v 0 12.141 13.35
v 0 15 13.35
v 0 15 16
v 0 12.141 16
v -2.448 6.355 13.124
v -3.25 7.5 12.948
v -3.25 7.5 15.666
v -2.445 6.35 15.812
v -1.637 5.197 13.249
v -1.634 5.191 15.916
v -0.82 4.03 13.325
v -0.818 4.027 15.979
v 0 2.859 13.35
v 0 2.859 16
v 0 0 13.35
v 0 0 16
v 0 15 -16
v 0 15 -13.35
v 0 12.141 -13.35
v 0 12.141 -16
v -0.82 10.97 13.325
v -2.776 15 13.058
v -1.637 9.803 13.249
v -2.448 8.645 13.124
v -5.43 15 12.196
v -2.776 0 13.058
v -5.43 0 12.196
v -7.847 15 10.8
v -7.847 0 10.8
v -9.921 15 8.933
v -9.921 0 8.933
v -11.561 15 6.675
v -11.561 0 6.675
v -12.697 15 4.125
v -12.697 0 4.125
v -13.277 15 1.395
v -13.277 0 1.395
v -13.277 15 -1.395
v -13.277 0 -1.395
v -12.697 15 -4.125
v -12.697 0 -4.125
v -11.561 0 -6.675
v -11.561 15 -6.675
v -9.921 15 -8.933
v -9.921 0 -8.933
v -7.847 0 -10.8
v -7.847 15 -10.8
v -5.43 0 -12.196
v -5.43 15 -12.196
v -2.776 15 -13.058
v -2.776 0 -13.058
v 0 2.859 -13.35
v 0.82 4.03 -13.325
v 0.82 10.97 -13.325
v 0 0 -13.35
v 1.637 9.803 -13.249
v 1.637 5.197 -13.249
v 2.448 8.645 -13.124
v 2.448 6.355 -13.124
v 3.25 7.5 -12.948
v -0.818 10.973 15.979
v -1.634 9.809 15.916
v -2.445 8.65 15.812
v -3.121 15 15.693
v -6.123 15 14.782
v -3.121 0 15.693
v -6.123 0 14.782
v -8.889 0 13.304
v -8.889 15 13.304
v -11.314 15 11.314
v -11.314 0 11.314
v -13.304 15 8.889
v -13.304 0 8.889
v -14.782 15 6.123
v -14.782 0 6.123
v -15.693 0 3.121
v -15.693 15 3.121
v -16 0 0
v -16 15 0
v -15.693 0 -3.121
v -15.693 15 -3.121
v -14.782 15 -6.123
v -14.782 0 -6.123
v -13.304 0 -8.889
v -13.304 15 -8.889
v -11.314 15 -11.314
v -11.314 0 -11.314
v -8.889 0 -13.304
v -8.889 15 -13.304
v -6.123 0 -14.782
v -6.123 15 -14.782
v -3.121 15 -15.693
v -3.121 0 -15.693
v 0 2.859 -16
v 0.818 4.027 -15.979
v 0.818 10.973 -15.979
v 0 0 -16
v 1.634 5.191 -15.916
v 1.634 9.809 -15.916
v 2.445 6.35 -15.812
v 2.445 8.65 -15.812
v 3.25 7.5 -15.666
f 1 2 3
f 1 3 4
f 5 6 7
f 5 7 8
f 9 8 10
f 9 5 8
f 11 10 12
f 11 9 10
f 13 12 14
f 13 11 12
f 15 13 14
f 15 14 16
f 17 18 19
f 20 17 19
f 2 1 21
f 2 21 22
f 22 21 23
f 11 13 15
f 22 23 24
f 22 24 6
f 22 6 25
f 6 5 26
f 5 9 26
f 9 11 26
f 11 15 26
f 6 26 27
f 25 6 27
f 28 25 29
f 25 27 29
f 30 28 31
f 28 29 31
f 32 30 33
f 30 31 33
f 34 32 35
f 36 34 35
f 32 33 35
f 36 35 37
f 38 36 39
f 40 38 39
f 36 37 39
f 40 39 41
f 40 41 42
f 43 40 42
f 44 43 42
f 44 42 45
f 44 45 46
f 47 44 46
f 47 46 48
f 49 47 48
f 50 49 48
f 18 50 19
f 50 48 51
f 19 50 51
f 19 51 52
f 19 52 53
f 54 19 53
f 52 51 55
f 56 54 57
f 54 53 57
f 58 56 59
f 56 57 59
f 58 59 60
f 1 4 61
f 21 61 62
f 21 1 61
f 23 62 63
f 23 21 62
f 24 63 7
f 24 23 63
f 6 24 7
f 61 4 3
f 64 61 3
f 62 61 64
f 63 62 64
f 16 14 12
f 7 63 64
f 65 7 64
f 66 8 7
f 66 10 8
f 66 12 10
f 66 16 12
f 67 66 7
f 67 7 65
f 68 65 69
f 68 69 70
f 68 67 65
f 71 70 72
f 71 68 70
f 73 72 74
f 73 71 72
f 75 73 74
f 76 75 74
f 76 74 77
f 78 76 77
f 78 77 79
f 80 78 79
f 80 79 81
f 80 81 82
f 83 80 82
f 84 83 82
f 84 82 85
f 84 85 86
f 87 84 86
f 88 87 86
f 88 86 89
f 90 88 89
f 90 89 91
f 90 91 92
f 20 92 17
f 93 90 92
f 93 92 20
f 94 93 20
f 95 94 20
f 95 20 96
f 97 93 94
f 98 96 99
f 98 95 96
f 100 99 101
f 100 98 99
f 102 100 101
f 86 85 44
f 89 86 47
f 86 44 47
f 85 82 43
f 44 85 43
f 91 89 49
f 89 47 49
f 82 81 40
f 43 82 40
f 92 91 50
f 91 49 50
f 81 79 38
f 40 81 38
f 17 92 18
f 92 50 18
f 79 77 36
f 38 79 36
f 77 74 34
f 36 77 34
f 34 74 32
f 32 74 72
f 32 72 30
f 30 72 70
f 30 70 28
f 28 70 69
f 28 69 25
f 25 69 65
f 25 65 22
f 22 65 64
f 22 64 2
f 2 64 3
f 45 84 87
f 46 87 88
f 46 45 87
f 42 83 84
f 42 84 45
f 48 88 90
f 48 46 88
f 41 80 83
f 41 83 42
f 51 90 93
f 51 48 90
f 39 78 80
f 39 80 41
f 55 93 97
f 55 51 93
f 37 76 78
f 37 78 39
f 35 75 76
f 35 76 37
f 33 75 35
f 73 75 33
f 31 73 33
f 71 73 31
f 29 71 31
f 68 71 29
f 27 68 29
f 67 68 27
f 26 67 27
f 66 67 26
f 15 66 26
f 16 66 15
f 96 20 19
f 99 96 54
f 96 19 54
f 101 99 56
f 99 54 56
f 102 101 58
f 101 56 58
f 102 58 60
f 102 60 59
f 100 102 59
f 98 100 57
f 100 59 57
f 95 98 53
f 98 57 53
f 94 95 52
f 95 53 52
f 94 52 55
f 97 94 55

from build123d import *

# Parameters (mm, degrees)
F0_R     = 16
F0_R_2   = 13.35
F1_DEPTH = 15
F3_DEPTH = 25
F5_DEPTH = 25


with BuildPart() as f1:
    # F0 (on Front) → F1 (new body)
    with BuildSketch(Plane.XZ):
        Circle(F0_R)
        Circle(F0_R_2, mode=Mode.SUBTRACT)
    extrude(amount=-F1_DEPTH)

    # F2 (on Top) → F3 (cut)
    with BuildSketch(Plane.XY):
        Polygon((16, 0), (16, 15), (0, 15), (0, 12.141481), (3.25, 7.5), (0, 2.858519), (0, 0), align=None)
    extrude(amount=-F3_DEPTH, mode=Mode.SUBTRACT)

    # F4 (on Top) → F5 (cut)
    with BuildSketch(Plane.XY):
        Polygon((16, 0), (16, 15), (0, 15), (0, 12.141481), (-3.25, 7.5), (0, 2.858519), (0, 0), align=None)
    extrude(amount=F5_DEPTH, mode=Mode.SUBTRACT)


solid = f1.part
